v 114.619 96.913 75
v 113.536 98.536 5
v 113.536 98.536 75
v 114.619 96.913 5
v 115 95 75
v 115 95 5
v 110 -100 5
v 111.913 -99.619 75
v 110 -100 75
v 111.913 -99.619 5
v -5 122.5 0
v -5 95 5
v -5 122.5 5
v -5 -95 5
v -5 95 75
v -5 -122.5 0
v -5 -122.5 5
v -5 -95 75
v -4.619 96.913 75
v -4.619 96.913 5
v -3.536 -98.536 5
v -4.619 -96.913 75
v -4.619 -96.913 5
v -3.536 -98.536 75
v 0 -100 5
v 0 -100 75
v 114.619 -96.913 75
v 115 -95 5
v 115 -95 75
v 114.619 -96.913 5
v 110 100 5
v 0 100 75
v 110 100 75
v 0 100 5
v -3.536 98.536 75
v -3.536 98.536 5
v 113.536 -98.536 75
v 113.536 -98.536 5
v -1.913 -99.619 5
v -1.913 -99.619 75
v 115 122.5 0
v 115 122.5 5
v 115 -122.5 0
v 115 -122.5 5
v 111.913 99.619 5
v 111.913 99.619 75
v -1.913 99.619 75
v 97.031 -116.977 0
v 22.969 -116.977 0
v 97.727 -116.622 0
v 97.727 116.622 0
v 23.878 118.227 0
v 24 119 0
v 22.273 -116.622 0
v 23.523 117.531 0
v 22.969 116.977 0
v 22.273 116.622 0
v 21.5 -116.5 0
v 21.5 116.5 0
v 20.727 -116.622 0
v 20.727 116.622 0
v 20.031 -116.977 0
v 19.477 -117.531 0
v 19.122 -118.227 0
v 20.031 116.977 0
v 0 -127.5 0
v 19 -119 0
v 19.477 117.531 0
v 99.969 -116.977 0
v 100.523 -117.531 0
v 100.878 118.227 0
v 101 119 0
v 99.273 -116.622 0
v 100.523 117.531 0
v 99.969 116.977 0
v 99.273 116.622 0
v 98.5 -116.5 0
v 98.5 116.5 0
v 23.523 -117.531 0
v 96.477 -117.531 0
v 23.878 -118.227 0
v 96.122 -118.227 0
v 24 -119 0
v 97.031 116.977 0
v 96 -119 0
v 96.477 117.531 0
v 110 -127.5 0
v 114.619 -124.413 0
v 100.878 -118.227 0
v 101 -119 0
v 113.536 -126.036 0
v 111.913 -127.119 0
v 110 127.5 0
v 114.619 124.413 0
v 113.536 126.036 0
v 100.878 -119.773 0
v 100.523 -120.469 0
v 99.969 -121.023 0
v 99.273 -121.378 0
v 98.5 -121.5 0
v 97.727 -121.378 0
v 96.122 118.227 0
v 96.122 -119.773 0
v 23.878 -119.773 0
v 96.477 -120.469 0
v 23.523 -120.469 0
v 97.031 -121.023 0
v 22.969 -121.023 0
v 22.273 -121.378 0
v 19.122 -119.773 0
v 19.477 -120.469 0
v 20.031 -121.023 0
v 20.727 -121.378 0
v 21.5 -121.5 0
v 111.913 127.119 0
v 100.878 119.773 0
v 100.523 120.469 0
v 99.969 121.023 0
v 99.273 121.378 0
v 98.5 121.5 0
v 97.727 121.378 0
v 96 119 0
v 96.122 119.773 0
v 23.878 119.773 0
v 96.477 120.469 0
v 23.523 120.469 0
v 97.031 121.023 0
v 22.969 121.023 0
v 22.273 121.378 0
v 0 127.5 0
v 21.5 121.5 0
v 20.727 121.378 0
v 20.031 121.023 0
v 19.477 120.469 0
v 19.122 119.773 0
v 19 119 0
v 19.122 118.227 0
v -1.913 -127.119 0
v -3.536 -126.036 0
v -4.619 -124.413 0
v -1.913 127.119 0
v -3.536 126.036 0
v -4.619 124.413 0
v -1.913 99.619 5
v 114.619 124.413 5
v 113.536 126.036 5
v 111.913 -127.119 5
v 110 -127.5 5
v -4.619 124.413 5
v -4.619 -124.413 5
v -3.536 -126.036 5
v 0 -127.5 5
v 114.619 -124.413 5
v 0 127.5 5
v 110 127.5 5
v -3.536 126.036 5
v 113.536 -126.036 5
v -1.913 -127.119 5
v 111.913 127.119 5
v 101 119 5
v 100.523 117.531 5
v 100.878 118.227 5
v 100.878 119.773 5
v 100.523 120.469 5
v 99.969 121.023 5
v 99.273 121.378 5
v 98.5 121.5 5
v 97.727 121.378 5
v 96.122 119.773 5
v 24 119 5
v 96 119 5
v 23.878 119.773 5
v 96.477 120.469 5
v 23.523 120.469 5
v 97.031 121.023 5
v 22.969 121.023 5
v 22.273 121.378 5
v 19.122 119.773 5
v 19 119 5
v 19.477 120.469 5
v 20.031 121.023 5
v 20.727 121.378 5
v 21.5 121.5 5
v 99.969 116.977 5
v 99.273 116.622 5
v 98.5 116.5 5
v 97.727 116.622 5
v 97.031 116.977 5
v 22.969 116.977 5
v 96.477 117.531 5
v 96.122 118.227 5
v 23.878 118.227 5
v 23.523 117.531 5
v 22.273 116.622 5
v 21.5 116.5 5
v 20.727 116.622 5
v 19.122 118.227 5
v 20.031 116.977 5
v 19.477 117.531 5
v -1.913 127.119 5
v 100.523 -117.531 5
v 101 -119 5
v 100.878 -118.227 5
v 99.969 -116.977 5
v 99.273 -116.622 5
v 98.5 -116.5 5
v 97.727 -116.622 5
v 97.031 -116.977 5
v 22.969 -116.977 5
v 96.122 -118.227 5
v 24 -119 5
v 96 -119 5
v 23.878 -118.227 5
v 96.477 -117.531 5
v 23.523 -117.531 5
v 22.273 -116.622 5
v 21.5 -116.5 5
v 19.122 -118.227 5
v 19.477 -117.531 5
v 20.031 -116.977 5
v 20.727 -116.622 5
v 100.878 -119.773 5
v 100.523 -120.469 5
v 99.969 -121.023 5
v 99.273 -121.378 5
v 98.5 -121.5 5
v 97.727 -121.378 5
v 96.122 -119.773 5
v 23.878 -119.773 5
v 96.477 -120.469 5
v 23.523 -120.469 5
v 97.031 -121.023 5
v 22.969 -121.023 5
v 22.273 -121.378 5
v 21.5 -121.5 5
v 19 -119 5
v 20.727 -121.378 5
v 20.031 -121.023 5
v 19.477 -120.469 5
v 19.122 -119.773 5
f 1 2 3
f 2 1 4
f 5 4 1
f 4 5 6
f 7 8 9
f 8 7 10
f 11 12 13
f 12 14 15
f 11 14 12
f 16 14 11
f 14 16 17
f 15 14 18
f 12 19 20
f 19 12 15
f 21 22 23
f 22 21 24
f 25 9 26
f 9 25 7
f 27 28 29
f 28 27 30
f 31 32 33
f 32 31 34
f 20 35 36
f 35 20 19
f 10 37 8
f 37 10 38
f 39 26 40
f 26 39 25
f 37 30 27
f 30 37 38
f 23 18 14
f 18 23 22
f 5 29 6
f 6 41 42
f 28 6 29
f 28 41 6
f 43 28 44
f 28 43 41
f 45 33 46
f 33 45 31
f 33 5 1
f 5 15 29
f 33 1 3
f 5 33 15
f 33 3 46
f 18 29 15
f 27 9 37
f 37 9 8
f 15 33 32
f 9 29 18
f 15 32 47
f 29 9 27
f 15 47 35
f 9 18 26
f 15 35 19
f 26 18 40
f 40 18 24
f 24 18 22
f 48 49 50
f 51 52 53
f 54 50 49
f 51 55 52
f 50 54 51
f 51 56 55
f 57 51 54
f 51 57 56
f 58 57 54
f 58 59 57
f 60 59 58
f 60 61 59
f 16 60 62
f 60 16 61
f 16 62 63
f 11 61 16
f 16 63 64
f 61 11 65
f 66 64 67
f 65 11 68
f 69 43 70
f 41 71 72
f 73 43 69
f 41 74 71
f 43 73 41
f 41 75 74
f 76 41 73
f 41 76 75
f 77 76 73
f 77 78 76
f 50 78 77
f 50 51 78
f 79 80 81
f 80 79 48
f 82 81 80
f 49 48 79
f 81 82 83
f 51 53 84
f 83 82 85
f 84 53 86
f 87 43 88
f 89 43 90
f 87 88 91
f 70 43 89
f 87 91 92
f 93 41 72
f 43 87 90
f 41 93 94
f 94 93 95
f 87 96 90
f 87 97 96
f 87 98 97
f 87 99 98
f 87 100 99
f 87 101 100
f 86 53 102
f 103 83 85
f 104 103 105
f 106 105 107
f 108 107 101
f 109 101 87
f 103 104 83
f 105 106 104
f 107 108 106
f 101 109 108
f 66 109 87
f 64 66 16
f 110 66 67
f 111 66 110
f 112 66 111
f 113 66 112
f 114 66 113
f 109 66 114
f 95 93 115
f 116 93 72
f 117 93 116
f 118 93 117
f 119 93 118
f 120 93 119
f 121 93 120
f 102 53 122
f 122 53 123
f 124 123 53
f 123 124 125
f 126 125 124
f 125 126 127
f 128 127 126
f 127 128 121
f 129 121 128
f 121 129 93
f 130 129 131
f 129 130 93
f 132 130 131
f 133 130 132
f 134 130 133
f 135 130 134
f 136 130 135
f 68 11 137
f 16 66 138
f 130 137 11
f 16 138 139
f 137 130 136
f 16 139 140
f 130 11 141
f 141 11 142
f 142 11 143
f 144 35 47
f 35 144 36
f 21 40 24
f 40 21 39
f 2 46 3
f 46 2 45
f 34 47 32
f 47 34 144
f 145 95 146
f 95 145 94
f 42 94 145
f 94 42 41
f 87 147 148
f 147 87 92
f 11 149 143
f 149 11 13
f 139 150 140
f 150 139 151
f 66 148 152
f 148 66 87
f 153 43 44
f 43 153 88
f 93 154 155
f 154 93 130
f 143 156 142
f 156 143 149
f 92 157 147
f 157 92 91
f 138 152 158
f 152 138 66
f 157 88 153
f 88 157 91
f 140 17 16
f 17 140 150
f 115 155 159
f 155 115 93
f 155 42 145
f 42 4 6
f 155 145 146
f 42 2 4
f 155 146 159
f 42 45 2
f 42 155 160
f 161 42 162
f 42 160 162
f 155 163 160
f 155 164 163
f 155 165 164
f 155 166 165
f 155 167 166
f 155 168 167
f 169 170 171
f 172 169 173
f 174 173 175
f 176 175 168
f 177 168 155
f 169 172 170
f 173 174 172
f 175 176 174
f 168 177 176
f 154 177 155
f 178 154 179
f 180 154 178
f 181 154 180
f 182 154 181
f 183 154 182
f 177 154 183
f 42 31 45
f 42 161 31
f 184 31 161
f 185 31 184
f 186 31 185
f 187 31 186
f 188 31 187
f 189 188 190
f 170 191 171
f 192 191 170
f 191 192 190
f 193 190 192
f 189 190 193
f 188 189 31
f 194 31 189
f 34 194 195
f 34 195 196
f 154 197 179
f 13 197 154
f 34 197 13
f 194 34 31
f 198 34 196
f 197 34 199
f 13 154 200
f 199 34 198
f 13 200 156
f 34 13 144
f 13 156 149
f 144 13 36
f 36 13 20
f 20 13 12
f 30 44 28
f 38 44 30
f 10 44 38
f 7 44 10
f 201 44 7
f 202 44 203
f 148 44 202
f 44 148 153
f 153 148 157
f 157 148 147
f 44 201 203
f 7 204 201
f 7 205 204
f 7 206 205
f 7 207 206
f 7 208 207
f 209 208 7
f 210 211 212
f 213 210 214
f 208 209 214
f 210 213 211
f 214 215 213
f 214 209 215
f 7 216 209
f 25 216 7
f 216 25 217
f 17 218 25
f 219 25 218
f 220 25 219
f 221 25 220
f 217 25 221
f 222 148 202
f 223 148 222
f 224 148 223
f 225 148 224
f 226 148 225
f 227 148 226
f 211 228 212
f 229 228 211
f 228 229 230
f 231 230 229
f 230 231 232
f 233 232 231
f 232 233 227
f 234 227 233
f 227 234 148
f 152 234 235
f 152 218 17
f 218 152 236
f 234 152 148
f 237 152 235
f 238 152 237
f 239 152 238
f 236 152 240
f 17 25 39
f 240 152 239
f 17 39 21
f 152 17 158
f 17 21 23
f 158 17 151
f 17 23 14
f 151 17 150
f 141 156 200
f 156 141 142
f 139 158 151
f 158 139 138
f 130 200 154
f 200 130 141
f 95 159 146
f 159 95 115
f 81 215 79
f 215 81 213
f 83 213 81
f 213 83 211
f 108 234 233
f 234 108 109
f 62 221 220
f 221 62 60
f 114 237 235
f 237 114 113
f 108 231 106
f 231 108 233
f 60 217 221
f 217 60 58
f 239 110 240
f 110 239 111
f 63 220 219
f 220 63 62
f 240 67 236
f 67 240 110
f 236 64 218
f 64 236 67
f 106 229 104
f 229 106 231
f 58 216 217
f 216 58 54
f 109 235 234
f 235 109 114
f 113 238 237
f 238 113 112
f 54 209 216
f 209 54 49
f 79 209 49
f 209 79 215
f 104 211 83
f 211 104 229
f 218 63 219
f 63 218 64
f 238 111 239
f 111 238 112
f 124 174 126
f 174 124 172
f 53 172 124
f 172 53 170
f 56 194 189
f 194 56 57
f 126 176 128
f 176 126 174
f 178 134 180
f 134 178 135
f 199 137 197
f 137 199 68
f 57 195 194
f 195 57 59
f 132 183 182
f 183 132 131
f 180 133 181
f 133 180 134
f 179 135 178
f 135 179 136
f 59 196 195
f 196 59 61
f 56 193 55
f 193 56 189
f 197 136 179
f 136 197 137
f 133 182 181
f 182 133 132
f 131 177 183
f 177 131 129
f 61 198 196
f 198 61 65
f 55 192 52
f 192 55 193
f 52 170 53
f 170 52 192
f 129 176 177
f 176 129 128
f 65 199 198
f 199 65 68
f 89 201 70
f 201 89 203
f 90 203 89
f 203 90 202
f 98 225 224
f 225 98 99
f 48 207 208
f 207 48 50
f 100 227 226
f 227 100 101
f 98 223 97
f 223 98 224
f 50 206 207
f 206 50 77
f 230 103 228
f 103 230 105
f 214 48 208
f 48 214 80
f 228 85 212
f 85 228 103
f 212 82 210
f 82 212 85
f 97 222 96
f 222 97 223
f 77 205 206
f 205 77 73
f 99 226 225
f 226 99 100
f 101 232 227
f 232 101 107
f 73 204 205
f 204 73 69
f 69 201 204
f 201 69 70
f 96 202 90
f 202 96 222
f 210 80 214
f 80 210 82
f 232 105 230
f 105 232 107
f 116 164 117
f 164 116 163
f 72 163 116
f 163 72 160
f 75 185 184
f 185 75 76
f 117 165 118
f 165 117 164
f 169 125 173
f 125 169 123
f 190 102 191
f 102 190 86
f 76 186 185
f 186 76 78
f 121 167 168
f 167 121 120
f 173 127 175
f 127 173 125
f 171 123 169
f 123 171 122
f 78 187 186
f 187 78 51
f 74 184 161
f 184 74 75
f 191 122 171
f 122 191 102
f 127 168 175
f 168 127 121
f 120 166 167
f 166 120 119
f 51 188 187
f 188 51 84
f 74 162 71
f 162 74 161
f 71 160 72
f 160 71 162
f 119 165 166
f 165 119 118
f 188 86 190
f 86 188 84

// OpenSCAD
otvory_prumer=5;
odkrajeY=6+otvory_prumer/2;
odkrajeX=19+otvory_prumer/2;
delkaC=255;
delkaB=200;
sirka=120;
radius=5;

module krabice(){
    color("Pink")
    difference(){
        union(){
            linear_extrude(height=75){
                minkowski(){
                    translate([(sirka-2*radius)/2,0])
                    circle(radius);
                    square([sirka-2*radius,delkaB-2*radius],center=true);
                }
            }    
            linear_extrude(height=5){
                minkowski(){
                    translate([(sirka-2*radius)/2,0])
                    circle(5);
                    square([sirka-2*radius,delkaC-2*radius],center=true);
                }
            }
        }
        for(a=[odkrajeX:sirka-2*odkrajeX:sirka-odkrajeX]){
            for(b=[odkrajeY-delkaC/2:delkaC-2*odkrajeY:delkaC/2-odkrajeY]){
                translate([a,b,-1])
                    cylinder(d=otvory_prumer,h=10,$fn=20);
            }
        } 
        
    }   
}

krabice();
